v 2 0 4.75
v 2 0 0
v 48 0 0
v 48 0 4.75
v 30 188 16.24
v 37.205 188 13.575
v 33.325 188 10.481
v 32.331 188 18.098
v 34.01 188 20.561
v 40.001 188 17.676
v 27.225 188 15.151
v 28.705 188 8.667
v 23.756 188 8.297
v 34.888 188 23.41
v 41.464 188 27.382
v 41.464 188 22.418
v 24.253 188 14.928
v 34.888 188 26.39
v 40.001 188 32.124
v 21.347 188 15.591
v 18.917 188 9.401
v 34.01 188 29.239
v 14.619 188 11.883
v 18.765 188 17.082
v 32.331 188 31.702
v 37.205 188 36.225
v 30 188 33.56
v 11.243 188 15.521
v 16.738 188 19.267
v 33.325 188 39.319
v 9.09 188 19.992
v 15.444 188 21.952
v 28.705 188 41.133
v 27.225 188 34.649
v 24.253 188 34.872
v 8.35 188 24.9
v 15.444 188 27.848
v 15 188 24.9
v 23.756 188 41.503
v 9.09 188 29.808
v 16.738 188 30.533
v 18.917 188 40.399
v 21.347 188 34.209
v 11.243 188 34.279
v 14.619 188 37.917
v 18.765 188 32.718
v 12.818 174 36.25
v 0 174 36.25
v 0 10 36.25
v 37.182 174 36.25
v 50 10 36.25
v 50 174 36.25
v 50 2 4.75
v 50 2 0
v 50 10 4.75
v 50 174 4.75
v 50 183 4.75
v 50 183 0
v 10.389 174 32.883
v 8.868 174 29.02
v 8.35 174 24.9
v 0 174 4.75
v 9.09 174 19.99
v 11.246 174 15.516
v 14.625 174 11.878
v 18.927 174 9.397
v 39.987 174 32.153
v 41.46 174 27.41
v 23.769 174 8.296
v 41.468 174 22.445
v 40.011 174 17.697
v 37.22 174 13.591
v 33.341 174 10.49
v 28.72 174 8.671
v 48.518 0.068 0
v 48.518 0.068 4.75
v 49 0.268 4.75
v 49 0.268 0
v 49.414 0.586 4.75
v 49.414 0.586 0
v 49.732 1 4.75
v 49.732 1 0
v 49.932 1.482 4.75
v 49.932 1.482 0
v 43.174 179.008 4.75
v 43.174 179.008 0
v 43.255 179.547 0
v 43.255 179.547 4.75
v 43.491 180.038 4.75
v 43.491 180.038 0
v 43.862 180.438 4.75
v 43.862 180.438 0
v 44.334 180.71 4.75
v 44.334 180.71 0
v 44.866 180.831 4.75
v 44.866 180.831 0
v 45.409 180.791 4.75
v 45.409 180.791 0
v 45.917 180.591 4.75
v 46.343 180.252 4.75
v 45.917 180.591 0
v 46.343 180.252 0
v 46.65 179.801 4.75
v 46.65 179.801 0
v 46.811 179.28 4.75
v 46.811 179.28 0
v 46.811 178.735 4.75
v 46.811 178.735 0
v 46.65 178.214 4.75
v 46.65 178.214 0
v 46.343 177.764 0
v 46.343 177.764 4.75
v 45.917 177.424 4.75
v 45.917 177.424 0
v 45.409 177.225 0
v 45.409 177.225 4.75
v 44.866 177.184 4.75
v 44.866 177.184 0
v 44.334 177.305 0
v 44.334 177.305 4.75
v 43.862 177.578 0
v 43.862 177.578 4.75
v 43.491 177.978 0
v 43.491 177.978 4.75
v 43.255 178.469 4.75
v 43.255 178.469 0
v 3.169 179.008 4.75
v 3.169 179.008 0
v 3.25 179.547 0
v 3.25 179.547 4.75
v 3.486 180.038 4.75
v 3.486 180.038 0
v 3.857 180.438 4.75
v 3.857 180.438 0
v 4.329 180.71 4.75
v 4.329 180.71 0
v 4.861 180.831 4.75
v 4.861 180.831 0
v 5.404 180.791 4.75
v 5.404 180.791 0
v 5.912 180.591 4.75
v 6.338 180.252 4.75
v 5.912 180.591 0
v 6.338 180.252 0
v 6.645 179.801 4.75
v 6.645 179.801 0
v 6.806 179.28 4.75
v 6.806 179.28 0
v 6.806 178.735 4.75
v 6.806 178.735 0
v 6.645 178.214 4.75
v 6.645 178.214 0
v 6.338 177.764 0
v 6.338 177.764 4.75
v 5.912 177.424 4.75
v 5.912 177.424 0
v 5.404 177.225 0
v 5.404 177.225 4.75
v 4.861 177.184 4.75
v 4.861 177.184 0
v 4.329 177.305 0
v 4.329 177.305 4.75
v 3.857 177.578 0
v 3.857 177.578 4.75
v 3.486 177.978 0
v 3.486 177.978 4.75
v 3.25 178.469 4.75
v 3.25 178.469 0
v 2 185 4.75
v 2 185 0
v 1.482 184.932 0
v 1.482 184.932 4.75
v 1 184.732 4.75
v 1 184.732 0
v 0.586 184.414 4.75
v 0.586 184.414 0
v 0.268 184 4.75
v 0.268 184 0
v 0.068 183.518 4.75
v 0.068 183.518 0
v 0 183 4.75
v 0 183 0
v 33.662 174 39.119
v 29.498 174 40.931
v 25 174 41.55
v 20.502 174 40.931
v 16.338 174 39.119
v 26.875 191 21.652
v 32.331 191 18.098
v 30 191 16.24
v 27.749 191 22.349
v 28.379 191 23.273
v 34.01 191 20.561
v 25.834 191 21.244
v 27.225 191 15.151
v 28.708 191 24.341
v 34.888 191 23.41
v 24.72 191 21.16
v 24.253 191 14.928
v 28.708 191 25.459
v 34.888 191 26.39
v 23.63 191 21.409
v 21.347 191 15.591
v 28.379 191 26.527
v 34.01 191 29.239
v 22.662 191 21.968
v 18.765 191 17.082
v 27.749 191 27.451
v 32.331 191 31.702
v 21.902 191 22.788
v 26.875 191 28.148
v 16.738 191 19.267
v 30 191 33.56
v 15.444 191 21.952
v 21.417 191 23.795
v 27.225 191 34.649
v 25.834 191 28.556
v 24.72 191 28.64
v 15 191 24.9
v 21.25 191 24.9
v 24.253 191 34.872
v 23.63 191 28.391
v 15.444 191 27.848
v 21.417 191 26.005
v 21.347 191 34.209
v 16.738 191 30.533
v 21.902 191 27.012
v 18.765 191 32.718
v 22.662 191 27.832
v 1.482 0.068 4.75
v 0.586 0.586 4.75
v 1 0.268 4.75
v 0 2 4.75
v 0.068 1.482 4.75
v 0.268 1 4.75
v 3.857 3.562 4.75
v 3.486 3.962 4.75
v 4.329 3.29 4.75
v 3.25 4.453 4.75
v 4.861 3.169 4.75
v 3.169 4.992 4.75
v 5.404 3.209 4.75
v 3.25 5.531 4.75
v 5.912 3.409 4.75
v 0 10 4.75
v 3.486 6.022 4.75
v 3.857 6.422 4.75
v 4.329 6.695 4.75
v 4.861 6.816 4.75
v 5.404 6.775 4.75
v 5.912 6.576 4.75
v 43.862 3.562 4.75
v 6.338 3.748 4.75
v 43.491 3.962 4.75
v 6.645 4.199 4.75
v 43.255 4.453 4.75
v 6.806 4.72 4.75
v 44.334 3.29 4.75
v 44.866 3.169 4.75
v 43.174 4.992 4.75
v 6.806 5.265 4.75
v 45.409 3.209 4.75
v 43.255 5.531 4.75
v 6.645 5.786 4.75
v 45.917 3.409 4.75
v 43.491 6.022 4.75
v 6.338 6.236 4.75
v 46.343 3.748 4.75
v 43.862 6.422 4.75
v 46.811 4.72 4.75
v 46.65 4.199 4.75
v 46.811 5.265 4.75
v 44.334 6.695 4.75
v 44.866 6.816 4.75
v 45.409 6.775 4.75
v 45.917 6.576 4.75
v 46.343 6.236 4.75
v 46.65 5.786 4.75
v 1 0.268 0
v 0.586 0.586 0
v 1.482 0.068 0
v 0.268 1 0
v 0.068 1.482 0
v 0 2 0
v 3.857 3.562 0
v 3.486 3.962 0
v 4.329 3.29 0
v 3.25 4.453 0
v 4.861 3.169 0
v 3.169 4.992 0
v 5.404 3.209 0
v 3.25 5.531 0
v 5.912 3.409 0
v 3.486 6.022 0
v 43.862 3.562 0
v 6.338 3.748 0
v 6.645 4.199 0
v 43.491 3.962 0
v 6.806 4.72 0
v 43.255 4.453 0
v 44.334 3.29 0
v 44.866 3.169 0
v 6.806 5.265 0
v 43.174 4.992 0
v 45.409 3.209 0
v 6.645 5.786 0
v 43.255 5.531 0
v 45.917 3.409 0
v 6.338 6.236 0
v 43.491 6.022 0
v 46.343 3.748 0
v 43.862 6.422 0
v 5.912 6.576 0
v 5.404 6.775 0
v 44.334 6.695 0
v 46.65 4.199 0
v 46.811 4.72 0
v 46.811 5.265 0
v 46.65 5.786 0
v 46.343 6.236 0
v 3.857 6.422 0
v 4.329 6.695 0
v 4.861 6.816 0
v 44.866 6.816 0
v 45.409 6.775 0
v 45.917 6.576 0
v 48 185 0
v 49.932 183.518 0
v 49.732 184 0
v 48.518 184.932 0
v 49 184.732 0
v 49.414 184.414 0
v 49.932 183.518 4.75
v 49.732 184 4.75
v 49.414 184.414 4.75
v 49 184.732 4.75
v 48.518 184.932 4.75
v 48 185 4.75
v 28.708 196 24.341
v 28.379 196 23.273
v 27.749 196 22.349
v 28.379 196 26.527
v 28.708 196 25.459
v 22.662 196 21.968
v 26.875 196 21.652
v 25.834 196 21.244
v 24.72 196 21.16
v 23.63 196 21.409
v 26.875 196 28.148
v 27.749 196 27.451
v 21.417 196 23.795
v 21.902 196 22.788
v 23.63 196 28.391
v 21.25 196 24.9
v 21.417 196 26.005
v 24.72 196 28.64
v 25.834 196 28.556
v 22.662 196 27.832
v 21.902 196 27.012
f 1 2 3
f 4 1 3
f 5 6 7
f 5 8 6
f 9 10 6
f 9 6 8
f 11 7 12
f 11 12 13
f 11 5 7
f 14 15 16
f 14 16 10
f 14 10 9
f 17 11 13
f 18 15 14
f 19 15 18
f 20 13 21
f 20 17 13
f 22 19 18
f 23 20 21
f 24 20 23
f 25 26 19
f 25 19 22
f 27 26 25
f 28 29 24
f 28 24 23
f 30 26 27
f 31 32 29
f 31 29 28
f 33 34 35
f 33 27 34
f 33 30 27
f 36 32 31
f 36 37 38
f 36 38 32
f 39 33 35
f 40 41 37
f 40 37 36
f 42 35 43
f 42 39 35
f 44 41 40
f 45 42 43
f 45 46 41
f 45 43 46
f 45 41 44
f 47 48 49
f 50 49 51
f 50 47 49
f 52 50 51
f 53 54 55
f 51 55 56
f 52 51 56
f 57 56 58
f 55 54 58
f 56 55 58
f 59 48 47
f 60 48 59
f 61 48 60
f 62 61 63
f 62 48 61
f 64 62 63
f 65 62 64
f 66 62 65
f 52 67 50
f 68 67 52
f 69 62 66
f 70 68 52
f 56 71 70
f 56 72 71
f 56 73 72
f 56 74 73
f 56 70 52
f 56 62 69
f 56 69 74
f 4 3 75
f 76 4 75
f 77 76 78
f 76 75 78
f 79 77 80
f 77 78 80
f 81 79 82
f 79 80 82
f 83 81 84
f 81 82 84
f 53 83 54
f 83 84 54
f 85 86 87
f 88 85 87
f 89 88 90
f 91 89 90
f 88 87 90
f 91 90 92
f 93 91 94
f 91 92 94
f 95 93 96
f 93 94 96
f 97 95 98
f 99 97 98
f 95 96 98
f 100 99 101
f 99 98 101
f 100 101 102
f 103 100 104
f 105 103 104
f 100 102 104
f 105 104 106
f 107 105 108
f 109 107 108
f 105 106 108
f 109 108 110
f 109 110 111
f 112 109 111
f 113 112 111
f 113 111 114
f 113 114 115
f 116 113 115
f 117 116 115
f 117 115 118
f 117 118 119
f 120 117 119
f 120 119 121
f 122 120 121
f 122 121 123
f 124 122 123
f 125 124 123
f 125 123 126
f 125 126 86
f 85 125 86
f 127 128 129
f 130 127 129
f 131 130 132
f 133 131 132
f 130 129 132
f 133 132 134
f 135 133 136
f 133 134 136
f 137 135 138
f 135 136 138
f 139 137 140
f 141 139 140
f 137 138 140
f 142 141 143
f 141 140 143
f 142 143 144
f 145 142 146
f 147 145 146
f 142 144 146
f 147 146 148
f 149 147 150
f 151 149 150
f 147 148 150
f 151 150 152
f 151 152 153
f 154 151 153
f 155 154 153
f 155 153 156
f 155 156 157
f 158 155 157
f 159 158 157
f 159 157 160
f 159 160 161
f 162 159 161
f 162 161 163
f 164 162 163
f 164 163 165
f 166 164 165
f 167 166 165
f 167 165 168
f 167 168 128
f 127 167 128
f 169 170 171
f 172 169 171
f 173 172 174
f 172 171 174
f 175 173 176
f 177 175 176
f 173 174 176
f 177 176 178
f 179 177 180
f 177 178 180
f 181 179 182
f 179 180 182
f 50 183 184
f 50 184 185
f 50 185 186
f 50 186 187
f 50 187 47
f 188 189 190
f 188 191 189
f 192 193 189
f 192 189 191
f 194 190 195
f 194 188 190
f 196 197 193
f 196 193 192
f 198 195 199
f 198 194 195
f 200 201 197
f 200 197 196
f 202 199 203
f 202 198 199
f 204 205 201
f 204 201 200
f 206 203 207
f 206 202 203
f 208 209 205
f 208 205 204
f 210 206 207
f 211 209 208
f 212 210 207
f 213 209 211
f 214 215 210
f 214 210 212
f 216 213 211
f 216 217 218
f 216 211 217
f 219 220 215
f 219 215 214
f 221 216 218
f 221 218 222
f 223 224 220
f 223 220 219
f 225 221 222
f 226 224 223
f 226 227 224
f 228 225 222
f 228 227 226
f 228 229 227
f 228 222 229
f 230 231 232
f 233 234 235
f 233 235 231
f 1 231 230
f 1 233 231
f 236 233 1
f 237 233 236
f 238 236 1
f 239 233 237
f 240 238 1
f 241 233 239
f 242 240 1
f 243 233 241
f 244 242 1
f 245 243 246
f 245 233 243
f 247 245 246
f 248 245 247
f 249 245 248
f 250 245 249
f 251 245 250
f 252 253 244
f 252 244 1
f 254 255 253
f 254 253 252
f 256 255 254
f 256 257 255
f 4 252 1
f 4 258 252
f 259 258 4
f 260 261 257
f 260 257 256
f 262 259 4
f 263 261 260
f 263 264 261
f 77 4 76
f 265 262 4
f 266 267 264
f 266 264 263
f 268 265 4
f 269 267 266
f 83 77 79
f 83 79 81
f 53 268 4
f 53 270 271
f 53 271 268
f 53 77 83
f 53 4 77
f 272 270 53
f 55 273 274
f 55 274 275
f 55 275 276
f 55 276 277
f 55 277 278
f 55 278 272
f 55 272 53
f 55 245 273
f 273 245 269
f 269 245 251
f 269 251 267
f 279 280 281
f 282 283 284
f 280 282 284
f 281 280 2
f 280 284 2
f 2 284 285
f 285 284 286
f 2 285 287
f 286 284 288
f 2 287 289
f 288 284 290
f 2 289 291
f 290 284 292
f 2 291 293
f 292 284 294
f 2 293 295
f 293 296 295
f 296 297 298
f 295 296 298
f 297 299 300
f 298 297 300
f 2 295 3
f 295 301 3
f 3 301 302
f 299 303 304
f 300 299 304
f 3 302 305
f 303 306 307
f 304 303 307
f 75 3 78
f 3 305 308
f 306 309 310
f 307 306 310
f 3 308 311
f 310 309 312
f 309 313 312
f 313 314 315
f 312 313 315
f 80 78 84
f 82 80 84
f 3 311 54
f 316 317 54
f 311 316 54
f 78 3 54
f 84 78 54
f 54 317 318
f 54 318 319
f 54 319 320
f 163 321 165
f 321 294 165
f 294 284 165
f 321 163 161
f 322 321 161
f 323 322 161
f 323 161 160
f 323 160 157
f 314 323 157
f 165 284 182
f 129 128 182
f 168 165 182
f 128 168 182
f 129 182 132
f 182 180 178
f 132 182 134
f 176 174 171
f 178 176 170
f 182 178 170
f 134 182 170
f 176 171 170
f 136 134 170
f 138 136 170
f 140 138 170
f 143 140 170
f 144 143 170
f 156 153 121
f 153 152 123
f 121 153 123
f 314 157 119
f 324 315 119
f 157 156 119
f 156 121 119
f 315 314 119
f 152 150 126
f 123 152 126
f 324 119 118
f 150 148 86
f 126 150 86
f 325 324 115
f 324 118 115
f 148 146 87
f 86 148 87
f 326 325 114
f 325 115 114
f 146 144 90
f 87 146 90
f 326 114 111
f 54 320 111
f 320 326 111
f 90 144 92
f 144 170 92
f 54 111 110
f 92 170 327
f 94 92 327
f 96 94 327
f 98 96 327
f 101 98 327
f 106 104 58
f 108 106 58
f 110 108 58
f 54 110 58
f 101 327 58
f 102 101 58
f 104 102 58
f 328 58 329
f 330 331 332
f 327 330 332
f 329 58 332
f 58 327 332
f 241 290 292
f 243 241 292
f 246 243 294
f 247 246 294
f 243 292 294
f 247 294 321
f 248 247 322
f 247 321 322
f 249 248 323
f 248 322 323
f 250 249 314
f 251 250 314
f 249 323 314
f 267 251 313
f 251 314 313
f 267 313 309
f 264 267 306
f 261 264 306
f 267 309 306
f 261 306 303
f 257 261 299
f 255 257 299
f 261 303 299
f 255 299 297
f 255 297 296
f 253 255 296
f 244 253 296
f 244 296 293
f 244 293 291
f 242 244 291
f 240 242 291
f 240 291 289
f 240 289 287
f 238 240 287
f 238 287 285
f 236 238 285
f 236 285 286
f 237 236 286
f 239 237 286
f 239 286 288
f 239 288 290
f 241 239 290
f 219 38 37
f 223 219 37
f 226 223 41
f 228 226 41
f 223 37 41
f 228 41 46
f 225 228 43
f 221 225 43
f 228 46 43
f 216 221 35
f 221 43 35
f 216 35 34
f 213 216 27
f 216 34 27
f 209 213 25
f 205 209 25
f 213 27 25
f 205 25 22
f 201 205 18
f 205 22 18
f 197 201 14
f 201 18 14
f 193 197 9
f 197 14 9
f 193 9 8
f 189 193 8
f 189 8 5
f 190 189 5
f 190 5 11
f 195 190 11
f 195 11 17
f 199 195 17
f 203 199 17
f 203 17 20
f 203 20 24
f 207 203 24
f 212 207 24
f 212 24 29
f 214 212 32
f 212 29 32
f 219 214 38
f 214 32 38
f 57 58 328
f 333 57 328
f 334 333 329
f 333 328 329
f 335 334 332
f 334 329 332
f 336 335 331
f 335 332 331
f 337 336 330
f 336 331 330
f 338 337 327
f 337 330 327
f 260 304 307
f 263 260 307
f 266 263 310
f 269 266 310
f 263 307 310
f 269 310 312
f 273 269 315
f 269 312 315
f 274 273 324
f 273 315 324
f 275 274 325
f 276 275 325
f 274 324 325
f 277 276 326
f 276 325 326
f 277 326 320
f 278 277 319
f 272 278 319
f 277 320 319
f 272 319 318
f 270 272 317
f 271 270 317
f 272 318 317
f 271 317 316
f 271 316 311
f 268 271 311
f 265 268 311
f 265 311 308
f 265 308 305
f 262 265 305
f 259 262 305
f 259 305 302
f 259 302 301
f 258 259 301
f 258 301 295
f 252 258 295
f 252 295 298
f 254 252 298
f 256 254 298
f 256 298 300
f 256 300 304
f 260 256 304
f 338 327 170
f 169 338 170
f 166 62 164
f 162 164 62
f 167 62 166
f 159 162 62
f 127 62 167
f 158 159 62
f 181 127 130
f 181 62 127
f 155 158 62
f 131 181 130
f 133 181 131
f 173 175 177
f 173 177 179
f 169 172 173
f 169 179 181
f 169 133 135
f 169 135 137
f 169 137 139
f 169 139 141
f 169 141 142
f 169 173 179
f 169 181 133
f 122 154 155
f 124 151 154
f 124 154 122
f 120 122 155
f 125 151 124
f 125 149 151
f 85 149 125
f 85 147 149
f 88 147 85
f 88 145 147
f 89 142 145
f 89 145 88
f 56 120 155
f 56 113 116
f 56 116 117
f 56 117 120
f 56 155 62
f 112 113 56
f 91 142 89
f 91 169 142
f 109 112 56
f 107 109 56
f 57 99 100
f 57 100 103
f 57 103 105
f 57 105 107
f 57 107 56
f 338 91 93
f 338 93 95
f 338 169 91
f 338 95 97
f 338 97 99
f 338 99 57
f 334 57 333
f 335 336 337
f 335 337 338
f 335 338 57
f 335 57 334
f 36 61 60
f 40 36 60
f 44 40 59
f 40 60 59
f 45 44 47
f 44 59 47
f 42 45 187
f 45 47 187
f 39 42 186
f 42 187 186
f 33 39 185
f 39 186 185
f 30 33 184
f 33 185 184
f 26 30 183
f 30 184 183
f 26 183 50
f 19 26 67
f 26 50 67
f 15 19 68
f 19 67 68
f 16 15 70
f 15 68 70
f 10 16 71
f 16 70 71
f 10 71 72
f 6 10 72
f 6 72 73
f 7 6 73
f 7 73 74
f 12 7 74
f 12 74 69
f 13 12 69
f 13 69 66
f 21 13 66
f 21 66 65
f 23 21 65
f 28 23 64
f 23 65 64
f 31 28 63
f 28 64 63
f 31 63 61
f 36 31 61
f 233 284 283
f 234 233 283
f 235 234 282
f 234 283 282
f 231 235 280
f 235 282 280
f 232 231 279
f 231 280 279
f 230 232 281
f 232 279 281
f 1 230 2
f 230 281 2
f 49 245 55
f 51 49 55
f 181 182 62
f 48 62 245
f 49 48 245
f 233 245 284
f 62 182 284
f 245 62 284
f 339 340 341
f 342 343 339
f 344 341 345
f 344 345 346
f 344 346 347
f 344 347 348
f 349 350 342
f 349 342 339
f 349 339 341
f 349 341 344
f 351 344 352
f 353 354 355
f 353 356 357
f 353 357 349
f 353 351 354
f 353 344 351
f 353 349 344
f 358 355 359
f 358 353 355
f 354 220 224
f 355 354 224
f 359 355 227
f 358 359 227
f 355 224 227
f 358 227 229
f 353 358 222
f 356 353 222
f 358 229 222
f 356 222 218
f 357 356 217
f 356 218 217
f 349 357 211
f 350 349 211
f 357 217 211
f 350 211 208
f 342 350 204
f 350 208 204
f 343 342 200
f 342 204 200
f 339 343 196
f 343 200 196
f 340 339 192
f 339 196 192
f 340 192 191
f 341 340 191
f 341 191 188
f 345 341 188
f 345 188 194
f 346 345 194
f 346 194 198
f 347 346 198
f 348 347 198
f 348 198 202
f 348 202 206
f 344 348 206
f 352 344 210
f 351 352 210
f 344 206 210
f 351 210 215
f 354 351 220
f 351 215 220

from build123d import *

# Parameters (mm, degrees)
F1_DEPTH  = 4.75
F2_W      = 50
F2_H      = 164
F3_DEPTH  = 31.5
F5_D      = 3.6576
F6_R      = 16.65
F7_DEPTH  = 14
F8_R      = 10
F9_DEPTH  = 3
F10_R     = 3.75
F11_DEPTH = 5


with BuildPart() as f1:
    # F0 (on Top) → F1 (new body)
    with BuildSketch(Plane.XY):
        with BuildLine():
            ThreePointArc((0, 2), (0.5857864376, 0.5857864376), (2, 0))
            Line((2, 0), (48, 0))
            ThreePointArc((48, 0), (49.4142135624, 0.5857864376), (50, 2))
            Line((50, 2), (50, 183))
            ThreePointArc((50, 183), (49.4142135624, 184.4142135624), (48, 185))
            Line((48, 185), (2, 185))
            ThreePointArc((2, 185), (0.5857864376, 184.4142135624), (0, 183))
            Line((0, 183), (0, 2))
        make_face()
    extrude(amount=F1_DEPTH)

    # F2 (on face) → F3 (join)
    with BuildSketch(Plane.XY.offset(4.75)):
        with Locations((25, 92)):
            Rectangle(F2_W, F2_H)
    extrude(amount=F3_DEPTH)

    # F5 (through all)
    with Locations(Plane.XY.offset(4.75)):
        with Locations((4.9975, 179.0077), (45.0025, 179.0077), (4.9975, 4.9923), (45.0025, 4.9923)):
            Hole(F5_D / 2)

    # F6 (on face) → F7 (join)
    with BuildSketch(Plane(origin=(0, 174, 0), x_dir=(-1, 0, 0), z_dir=(0, 1, 0))):
        with Locations((-25, 24.9)):
            Circle(F6_R)
    extrude(amount=F7_DEPTH)

    # F8 (on face) → F9 (join)
    with BuildSketch(Plane(origin=(0, 188, 0), x_dir=(-1, 0, 0), z_dir=(0, 1, 0))):
        with Locations((-25, 24.9)):
            Circle(F8_R)
    extrude(amount=F9_DEPTH)

    # F10 (on face) → F11 (join)
    with BuildSketch(Plane(origin=(0, 191, 0), x_dir=(-1, 0, 0), z_dir=(0, 1, 0))):
        with Locations((-25, 24.9)):
            Circle(F10_R)
    extrude(amount=F11_DEPTH)


solid = f1.part
